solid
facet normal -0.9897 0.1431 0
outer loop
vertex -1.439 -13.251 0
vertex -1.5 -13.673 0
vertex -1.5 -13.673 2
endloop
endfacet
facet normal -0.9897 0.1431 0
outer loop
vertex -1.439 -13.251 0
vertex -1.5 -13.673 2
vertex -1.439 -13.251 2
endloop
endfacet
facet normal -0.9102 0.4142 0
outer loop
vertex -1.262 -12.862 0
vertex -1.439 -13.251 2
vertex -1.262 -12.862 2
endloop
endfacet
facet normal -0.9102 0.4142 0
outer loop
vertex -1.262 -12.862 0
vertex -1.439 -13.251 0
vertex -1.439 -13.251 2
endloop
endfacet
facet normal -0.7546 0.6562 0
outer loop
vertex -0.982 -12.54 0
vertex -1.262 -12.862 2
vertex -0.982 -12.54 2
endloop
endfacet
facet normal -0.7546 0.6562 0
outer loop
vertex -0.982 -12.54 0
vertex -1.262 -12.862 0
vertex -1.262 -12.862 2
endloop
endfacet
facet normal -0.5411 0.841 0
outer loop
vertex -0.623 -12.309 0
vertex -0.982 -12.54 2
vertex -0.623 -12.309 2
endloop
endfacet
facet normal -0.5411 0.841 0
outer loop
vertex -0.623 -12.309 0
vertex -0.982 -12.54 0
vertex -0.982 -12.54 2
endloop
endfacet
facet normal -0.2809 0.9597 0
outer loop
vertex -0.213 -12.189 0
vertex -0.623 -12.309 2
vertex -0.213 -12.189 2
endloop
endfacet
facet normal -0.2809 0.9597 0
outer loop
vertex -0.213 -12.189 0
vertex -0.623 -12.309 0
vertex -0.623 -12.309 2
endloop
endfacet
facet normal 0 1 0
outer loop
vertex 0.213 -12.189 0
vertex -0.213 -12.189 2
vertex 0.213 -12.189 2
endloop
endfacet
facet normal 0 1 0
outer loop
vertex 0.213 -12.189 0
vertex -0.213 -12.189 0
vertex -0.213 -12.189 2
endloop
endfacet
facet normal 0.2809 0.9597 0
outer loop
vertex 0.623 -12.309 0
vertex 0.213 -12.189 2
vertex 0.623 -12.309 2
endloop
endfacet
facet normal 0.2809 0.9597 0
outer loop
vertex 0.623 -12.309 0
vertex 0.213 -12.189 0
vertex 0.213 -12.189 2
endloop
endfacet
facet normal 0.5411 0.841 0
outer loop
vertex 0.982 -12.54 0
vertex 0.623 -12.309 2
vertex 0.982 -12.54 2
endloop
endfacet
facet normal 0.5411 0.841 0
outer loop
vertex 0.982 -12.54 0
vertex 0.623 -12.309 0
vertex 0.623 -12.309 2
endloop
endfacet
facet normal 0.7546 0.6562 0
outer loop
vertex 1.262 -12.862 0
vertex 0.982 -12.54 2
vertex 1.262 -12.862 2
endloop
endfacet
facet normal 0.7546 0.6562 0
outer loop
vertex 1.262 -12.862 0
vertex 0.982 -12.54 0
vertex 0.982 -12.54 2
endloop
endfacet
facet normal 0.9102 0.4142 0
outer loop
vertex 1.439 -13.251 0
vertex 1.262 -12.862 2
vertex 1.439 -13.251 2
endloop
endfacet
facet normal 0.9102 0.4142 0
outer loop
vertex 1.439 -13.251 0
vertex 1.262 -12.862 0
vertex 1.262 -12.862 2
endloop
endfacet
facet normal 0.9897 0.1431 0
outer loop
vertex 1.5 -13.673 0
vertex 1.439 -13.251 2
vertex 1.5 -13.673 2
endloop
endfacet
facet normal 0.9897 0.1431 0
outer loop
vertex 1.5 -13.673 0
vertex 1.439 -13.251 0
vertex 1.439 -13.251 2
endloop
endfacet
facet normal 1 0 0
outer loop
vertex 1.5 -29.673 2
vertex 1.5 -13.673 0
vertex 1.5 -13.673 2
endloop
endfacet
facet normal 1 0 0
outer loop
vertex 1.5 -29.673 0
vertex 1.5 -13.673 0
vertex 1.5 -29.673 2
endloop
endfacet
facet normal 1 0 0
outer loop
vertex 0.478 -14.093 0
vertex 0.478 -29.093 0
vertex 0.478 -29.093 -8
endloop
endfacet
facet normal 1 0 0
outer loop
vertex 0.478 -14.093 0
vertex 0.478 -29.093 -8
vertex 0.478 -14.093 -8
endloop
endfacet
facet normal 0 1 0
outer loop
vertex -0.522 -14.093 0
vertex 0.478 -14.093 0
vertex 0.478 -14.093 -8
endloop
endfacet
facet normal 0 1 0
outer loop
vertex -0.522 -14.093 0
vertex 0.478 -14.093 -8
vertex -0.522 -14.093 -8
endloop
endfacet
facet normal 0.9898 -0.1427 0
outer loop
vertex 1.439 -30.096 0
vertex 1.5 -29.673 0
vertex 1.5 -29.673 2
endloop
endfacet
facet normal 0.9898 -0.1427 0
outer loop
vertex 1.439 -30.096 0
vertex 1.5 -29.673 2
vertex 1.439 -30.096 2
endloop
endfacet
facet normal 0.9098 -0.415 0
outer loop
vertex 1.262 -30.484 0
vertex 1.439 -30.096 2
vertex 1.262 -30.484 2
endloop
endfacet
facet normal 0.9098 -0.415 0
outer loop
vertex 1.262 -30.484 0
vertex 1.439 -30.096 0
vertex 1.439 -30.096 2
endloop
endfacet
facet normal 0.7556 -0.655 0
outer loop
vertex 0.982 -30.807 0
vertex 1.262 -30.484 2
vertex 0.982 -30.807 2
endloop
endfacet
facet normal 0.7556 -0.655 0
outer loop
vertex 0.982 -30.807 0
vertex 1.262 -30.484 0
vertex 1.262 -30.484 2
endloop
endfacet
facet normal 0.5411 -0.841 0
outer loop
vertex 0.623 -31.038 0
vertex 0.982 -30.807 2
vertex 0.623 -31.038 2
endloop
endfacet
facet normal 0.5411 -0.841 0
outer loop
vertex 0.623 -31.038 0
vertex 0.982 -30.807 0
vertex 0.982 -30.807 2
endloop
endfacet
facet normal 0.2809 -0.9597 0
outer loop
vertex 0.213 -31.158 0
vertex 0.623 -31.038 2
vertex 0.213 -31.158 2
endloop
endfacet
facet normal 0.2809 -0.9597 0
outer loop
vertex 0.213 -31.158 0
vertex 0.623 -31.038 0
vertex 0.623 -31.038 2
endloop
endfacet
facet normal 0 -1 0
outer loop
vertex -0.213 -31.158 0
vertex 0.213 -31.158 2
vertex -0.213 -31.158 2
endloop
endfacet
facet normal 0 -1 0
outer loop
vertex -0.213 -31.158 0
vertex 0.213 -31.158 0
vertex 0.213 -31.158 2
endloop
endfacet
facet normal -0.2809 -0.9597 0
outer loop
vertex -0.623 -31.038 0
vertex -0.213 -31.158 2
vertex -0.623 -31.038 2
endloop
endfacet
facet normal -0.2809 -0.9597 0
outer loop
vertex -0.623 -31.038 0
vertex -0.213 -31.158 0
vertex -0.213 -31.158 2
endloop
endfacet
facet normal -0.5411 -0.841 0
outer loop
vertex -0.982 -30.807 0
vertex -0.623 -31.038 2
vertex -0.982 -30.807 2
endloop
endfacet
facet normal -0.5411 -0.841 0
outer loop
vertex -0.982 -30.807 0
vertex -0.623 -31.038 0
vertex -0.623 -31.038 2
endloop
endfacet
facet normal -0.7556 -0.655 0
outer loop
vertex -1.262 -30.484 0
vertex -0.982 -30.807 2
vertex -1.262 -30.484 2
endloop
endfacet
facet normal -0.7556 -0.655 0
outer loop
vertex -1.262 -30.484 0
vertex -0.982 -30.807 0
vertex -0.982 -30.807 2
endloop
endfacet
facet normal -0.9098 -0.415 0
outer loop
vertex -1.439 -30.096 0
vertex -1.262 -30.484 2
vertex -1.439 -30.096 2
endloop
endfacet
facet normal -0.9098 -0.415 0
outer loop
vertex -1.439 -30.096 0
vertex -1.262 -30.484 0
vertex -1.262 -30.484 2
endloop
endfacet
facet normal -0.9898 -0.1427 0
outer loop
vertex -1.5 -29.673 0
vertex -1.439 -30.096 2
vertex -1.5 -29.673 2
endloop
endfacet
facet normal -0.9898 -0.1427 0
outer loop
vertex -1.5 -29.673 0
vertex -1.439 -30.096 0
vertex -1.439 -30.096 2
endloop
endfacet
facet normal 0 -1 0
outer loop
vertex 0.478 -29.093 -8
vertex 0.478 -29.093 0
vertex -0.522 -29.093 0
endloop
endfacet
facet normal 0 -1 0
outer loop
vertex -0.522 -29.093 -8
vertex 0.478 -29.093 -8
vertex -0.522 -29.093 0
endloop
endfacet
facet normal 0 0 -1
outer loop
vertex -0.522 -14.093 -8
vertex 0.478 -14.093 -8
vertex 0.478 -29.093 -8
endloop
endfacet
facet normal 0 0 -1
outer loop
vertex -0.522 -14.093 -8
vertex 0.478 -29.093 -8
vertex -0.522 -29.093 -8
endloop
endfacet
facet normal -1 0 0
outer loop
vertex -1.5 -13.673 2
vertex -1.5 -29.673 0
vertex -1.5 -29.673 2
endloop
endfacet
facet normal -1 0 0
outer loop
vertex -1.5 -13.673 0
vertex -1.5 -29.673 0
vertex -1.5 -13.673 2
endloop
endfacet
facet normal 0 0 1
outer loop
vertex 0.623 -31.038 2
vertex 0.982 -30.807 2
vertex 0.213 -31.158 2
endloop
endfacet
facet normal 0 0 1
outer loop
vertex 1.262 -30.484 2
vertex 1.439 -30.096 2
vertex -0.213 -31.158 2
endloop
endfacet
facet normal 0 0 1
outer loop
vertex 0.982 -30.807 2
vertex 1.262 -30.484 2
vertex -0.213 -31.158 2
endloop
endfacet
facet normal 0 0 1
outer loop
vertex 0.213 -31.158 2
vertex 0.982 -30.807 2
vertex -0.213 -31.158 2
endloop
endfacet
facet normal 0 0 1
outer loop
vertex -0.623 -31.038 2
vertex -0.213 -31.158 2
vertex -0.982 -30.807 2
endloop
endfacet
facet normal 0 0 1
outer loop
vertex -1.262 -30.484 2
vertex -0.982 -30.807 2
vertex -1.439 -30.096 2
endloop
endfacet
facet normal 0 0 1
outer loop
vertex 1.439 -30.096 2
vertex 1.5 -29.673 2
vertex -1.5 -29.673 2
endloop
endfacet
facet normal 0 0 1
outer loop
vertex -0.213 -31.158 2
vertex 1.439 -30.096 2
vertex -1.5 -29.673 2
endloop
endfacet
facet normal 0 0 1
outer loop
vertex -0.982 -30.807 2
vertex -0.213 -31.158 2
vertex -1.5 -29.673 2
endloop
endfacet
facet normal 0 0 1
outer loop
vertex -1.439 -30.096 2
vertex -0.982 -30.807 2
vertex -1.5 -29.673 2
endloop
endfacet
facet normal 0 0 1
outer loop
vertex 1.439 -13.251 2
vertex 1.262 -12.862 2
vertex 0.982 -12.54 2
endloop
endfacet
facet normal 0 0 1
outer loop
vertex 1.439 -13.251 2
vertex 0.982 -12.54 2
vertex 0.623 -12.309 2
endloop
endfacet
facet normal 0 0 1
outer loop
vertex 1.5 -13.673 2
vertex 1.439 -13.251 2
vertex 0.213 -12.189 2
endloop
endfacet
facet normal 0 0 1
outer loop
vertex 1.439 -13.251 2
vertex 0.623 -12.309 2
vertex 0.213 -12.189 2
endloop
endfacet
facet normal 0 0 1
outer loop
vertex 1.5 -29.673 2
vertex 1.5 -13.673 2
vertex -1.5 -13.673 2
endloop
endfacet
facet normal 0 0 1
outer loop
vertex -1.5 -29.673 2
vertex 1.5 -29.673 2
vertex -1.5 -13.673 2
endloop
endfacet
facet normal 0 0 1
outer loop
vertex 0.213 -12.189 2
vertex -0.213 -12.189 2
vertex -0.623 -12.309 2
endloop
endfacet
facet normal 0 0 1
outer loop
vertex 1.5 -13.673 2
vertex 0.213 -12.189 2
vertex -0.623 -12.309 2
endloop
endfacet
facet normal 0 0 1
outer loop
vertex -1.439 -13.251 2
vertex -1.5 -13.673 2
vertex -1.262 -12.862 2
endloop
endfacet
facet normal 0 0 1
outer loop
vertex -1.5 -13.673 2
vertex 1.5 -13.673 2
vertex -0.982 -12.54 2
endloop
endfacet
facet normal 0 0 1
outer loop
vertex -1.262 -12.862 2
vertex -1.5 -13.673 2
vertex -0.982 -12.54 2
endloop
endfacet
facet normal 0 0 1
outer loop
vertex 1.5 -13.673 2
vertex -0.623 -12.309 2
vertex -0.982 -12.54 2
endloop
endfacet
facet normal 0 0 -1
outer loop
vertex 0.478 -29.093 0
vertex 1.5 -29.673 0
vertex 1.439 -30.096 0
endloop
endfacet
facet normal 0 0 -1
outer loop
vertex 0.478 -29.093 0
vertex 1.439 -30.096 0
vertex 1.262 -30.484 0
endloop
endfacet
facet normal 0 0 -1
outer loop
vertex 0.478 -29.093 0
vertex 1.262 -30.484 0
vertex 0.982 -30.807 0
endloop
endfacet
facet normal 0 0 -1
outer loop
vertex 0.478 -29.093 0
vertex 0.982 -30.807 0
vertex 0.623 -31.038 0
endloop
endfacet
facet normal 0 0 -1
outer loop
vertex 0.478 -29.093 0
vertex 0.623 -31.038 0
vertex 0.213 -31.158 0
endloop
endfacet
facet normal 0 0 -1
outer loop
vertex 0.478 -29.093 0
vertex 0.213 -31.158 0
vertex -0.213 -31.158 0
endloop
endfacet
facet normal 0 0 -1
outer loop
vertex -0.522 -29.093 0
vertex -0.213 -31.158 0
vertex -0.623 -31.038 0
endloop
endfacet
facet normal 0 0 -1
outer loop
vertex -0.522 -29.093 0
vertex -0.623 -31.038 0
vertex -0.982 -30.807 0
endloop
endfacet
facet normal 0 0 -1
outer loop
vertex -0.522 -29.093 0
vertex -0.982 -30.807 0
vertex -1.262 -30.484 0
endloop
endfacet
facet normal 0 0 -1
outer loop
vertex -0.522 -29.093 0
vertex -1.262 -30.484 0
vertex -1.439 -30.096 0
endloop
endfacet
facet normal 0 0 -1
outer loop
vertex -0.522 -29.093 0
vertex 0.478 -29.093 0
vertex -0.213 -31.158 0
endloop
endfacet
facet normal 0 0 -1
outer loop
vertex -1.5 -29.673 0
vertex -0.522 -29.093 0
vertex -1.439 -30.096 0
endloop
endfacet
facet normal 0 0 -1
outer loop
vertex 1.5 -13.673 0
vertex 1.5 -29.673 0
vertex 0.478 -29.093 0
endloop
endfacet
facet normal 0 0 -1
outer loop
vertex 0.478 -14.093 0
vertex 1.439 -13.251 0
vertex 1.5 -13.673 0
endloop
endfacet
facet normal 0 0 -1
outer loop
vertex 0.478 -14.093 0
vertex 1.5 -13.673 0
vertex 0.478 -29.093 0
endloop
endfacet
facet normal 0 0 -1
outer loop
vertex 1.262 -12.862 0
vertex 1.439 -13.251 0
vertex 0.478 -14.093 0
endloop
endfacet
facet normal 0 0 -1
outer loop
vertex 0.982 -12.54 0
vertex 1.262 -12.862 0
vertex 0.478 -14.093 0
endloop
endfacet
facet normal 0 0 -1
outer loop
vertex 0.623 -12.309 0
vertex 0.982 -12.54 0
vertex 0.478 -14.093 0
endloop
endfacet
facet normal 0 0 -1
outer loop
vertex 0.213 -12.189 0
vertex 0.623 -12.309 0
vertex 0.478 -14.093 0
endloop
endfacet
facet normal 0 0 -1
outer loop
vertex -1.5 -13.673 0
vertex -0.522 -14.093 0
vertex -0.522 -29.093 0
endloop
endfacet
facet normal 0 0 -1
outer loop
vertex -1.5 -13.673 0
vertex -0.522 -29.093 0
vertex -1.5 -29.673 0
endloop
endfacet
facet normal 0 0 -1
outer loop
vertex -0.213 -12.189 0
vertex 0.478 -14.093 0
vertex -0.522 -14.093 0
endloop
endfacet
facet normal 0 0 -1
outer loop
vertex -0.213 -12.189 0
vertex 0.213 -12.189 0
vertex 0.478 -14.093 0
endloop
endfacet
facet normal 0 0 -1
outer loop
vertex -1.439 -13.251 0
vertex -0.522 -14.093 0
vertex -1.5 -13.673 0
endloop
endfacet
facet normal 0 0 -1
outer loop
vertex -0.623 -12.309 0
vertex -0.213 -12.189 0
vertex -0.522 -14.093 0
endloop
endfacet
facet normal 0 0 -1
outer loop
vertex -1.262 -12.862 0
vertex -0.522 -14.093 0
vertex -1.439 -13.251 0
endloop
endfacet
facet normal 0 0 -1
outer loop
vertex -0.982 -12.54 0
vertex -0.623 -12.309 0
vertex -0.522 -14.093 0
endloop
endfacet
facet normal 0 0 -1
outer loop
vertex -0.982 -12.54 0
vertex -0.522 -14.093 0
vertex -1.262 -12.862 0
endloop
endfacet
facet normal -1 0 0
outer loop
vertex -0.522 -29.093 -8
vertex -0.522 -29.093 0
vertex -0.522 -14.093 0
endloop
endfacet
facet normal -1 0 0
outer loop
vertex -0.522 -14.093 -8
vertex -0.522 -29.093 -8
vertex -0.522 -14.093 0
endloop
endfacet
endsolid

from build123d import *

# Parameters (mm, degrees)
EXTRUDE_1_DEPTH = 2
SKETCH_2_W      = 1
SKETCH_2_H      = 15
EXTRUDE_2_DEPTH = 8


with BuildPart() as part:
    # 草图1 → 凸台-拉伸1 (new body)
    with BuildSketch(Plane.XY):
        with BuildLine():
            Line((1.5, -13.673349455), (1.5, -29.673349455))
            ThreePointArc((1.5, -29.673349455), (0, -31.173349455), (-1.5, -29.673349455))
            Line((-1.5, -29.673349455), (-1.5, -13.673349455))
            ThreePointArc((-1.5, -13.673349455), (0, -12.173349455), (1.5, -13.673349455))
        make_face()
    extrude(amount=EXTRUDE_1_DEPTH)

    # 草图2 → 凸台-拉伸2 (add)
    with BuildSketch(Plane(origin=(0, 0, 0), x_dir=(-1, 0, 0), z_dir=(0, 0, -1))):
        with Locations((0.022272941, -21.592941234)):
            Rectangle(SKETCH_2_W, SKETCH_2_H)
    extrude(amount=EXTRUDE_2_DEPTH)


solid = part.part
